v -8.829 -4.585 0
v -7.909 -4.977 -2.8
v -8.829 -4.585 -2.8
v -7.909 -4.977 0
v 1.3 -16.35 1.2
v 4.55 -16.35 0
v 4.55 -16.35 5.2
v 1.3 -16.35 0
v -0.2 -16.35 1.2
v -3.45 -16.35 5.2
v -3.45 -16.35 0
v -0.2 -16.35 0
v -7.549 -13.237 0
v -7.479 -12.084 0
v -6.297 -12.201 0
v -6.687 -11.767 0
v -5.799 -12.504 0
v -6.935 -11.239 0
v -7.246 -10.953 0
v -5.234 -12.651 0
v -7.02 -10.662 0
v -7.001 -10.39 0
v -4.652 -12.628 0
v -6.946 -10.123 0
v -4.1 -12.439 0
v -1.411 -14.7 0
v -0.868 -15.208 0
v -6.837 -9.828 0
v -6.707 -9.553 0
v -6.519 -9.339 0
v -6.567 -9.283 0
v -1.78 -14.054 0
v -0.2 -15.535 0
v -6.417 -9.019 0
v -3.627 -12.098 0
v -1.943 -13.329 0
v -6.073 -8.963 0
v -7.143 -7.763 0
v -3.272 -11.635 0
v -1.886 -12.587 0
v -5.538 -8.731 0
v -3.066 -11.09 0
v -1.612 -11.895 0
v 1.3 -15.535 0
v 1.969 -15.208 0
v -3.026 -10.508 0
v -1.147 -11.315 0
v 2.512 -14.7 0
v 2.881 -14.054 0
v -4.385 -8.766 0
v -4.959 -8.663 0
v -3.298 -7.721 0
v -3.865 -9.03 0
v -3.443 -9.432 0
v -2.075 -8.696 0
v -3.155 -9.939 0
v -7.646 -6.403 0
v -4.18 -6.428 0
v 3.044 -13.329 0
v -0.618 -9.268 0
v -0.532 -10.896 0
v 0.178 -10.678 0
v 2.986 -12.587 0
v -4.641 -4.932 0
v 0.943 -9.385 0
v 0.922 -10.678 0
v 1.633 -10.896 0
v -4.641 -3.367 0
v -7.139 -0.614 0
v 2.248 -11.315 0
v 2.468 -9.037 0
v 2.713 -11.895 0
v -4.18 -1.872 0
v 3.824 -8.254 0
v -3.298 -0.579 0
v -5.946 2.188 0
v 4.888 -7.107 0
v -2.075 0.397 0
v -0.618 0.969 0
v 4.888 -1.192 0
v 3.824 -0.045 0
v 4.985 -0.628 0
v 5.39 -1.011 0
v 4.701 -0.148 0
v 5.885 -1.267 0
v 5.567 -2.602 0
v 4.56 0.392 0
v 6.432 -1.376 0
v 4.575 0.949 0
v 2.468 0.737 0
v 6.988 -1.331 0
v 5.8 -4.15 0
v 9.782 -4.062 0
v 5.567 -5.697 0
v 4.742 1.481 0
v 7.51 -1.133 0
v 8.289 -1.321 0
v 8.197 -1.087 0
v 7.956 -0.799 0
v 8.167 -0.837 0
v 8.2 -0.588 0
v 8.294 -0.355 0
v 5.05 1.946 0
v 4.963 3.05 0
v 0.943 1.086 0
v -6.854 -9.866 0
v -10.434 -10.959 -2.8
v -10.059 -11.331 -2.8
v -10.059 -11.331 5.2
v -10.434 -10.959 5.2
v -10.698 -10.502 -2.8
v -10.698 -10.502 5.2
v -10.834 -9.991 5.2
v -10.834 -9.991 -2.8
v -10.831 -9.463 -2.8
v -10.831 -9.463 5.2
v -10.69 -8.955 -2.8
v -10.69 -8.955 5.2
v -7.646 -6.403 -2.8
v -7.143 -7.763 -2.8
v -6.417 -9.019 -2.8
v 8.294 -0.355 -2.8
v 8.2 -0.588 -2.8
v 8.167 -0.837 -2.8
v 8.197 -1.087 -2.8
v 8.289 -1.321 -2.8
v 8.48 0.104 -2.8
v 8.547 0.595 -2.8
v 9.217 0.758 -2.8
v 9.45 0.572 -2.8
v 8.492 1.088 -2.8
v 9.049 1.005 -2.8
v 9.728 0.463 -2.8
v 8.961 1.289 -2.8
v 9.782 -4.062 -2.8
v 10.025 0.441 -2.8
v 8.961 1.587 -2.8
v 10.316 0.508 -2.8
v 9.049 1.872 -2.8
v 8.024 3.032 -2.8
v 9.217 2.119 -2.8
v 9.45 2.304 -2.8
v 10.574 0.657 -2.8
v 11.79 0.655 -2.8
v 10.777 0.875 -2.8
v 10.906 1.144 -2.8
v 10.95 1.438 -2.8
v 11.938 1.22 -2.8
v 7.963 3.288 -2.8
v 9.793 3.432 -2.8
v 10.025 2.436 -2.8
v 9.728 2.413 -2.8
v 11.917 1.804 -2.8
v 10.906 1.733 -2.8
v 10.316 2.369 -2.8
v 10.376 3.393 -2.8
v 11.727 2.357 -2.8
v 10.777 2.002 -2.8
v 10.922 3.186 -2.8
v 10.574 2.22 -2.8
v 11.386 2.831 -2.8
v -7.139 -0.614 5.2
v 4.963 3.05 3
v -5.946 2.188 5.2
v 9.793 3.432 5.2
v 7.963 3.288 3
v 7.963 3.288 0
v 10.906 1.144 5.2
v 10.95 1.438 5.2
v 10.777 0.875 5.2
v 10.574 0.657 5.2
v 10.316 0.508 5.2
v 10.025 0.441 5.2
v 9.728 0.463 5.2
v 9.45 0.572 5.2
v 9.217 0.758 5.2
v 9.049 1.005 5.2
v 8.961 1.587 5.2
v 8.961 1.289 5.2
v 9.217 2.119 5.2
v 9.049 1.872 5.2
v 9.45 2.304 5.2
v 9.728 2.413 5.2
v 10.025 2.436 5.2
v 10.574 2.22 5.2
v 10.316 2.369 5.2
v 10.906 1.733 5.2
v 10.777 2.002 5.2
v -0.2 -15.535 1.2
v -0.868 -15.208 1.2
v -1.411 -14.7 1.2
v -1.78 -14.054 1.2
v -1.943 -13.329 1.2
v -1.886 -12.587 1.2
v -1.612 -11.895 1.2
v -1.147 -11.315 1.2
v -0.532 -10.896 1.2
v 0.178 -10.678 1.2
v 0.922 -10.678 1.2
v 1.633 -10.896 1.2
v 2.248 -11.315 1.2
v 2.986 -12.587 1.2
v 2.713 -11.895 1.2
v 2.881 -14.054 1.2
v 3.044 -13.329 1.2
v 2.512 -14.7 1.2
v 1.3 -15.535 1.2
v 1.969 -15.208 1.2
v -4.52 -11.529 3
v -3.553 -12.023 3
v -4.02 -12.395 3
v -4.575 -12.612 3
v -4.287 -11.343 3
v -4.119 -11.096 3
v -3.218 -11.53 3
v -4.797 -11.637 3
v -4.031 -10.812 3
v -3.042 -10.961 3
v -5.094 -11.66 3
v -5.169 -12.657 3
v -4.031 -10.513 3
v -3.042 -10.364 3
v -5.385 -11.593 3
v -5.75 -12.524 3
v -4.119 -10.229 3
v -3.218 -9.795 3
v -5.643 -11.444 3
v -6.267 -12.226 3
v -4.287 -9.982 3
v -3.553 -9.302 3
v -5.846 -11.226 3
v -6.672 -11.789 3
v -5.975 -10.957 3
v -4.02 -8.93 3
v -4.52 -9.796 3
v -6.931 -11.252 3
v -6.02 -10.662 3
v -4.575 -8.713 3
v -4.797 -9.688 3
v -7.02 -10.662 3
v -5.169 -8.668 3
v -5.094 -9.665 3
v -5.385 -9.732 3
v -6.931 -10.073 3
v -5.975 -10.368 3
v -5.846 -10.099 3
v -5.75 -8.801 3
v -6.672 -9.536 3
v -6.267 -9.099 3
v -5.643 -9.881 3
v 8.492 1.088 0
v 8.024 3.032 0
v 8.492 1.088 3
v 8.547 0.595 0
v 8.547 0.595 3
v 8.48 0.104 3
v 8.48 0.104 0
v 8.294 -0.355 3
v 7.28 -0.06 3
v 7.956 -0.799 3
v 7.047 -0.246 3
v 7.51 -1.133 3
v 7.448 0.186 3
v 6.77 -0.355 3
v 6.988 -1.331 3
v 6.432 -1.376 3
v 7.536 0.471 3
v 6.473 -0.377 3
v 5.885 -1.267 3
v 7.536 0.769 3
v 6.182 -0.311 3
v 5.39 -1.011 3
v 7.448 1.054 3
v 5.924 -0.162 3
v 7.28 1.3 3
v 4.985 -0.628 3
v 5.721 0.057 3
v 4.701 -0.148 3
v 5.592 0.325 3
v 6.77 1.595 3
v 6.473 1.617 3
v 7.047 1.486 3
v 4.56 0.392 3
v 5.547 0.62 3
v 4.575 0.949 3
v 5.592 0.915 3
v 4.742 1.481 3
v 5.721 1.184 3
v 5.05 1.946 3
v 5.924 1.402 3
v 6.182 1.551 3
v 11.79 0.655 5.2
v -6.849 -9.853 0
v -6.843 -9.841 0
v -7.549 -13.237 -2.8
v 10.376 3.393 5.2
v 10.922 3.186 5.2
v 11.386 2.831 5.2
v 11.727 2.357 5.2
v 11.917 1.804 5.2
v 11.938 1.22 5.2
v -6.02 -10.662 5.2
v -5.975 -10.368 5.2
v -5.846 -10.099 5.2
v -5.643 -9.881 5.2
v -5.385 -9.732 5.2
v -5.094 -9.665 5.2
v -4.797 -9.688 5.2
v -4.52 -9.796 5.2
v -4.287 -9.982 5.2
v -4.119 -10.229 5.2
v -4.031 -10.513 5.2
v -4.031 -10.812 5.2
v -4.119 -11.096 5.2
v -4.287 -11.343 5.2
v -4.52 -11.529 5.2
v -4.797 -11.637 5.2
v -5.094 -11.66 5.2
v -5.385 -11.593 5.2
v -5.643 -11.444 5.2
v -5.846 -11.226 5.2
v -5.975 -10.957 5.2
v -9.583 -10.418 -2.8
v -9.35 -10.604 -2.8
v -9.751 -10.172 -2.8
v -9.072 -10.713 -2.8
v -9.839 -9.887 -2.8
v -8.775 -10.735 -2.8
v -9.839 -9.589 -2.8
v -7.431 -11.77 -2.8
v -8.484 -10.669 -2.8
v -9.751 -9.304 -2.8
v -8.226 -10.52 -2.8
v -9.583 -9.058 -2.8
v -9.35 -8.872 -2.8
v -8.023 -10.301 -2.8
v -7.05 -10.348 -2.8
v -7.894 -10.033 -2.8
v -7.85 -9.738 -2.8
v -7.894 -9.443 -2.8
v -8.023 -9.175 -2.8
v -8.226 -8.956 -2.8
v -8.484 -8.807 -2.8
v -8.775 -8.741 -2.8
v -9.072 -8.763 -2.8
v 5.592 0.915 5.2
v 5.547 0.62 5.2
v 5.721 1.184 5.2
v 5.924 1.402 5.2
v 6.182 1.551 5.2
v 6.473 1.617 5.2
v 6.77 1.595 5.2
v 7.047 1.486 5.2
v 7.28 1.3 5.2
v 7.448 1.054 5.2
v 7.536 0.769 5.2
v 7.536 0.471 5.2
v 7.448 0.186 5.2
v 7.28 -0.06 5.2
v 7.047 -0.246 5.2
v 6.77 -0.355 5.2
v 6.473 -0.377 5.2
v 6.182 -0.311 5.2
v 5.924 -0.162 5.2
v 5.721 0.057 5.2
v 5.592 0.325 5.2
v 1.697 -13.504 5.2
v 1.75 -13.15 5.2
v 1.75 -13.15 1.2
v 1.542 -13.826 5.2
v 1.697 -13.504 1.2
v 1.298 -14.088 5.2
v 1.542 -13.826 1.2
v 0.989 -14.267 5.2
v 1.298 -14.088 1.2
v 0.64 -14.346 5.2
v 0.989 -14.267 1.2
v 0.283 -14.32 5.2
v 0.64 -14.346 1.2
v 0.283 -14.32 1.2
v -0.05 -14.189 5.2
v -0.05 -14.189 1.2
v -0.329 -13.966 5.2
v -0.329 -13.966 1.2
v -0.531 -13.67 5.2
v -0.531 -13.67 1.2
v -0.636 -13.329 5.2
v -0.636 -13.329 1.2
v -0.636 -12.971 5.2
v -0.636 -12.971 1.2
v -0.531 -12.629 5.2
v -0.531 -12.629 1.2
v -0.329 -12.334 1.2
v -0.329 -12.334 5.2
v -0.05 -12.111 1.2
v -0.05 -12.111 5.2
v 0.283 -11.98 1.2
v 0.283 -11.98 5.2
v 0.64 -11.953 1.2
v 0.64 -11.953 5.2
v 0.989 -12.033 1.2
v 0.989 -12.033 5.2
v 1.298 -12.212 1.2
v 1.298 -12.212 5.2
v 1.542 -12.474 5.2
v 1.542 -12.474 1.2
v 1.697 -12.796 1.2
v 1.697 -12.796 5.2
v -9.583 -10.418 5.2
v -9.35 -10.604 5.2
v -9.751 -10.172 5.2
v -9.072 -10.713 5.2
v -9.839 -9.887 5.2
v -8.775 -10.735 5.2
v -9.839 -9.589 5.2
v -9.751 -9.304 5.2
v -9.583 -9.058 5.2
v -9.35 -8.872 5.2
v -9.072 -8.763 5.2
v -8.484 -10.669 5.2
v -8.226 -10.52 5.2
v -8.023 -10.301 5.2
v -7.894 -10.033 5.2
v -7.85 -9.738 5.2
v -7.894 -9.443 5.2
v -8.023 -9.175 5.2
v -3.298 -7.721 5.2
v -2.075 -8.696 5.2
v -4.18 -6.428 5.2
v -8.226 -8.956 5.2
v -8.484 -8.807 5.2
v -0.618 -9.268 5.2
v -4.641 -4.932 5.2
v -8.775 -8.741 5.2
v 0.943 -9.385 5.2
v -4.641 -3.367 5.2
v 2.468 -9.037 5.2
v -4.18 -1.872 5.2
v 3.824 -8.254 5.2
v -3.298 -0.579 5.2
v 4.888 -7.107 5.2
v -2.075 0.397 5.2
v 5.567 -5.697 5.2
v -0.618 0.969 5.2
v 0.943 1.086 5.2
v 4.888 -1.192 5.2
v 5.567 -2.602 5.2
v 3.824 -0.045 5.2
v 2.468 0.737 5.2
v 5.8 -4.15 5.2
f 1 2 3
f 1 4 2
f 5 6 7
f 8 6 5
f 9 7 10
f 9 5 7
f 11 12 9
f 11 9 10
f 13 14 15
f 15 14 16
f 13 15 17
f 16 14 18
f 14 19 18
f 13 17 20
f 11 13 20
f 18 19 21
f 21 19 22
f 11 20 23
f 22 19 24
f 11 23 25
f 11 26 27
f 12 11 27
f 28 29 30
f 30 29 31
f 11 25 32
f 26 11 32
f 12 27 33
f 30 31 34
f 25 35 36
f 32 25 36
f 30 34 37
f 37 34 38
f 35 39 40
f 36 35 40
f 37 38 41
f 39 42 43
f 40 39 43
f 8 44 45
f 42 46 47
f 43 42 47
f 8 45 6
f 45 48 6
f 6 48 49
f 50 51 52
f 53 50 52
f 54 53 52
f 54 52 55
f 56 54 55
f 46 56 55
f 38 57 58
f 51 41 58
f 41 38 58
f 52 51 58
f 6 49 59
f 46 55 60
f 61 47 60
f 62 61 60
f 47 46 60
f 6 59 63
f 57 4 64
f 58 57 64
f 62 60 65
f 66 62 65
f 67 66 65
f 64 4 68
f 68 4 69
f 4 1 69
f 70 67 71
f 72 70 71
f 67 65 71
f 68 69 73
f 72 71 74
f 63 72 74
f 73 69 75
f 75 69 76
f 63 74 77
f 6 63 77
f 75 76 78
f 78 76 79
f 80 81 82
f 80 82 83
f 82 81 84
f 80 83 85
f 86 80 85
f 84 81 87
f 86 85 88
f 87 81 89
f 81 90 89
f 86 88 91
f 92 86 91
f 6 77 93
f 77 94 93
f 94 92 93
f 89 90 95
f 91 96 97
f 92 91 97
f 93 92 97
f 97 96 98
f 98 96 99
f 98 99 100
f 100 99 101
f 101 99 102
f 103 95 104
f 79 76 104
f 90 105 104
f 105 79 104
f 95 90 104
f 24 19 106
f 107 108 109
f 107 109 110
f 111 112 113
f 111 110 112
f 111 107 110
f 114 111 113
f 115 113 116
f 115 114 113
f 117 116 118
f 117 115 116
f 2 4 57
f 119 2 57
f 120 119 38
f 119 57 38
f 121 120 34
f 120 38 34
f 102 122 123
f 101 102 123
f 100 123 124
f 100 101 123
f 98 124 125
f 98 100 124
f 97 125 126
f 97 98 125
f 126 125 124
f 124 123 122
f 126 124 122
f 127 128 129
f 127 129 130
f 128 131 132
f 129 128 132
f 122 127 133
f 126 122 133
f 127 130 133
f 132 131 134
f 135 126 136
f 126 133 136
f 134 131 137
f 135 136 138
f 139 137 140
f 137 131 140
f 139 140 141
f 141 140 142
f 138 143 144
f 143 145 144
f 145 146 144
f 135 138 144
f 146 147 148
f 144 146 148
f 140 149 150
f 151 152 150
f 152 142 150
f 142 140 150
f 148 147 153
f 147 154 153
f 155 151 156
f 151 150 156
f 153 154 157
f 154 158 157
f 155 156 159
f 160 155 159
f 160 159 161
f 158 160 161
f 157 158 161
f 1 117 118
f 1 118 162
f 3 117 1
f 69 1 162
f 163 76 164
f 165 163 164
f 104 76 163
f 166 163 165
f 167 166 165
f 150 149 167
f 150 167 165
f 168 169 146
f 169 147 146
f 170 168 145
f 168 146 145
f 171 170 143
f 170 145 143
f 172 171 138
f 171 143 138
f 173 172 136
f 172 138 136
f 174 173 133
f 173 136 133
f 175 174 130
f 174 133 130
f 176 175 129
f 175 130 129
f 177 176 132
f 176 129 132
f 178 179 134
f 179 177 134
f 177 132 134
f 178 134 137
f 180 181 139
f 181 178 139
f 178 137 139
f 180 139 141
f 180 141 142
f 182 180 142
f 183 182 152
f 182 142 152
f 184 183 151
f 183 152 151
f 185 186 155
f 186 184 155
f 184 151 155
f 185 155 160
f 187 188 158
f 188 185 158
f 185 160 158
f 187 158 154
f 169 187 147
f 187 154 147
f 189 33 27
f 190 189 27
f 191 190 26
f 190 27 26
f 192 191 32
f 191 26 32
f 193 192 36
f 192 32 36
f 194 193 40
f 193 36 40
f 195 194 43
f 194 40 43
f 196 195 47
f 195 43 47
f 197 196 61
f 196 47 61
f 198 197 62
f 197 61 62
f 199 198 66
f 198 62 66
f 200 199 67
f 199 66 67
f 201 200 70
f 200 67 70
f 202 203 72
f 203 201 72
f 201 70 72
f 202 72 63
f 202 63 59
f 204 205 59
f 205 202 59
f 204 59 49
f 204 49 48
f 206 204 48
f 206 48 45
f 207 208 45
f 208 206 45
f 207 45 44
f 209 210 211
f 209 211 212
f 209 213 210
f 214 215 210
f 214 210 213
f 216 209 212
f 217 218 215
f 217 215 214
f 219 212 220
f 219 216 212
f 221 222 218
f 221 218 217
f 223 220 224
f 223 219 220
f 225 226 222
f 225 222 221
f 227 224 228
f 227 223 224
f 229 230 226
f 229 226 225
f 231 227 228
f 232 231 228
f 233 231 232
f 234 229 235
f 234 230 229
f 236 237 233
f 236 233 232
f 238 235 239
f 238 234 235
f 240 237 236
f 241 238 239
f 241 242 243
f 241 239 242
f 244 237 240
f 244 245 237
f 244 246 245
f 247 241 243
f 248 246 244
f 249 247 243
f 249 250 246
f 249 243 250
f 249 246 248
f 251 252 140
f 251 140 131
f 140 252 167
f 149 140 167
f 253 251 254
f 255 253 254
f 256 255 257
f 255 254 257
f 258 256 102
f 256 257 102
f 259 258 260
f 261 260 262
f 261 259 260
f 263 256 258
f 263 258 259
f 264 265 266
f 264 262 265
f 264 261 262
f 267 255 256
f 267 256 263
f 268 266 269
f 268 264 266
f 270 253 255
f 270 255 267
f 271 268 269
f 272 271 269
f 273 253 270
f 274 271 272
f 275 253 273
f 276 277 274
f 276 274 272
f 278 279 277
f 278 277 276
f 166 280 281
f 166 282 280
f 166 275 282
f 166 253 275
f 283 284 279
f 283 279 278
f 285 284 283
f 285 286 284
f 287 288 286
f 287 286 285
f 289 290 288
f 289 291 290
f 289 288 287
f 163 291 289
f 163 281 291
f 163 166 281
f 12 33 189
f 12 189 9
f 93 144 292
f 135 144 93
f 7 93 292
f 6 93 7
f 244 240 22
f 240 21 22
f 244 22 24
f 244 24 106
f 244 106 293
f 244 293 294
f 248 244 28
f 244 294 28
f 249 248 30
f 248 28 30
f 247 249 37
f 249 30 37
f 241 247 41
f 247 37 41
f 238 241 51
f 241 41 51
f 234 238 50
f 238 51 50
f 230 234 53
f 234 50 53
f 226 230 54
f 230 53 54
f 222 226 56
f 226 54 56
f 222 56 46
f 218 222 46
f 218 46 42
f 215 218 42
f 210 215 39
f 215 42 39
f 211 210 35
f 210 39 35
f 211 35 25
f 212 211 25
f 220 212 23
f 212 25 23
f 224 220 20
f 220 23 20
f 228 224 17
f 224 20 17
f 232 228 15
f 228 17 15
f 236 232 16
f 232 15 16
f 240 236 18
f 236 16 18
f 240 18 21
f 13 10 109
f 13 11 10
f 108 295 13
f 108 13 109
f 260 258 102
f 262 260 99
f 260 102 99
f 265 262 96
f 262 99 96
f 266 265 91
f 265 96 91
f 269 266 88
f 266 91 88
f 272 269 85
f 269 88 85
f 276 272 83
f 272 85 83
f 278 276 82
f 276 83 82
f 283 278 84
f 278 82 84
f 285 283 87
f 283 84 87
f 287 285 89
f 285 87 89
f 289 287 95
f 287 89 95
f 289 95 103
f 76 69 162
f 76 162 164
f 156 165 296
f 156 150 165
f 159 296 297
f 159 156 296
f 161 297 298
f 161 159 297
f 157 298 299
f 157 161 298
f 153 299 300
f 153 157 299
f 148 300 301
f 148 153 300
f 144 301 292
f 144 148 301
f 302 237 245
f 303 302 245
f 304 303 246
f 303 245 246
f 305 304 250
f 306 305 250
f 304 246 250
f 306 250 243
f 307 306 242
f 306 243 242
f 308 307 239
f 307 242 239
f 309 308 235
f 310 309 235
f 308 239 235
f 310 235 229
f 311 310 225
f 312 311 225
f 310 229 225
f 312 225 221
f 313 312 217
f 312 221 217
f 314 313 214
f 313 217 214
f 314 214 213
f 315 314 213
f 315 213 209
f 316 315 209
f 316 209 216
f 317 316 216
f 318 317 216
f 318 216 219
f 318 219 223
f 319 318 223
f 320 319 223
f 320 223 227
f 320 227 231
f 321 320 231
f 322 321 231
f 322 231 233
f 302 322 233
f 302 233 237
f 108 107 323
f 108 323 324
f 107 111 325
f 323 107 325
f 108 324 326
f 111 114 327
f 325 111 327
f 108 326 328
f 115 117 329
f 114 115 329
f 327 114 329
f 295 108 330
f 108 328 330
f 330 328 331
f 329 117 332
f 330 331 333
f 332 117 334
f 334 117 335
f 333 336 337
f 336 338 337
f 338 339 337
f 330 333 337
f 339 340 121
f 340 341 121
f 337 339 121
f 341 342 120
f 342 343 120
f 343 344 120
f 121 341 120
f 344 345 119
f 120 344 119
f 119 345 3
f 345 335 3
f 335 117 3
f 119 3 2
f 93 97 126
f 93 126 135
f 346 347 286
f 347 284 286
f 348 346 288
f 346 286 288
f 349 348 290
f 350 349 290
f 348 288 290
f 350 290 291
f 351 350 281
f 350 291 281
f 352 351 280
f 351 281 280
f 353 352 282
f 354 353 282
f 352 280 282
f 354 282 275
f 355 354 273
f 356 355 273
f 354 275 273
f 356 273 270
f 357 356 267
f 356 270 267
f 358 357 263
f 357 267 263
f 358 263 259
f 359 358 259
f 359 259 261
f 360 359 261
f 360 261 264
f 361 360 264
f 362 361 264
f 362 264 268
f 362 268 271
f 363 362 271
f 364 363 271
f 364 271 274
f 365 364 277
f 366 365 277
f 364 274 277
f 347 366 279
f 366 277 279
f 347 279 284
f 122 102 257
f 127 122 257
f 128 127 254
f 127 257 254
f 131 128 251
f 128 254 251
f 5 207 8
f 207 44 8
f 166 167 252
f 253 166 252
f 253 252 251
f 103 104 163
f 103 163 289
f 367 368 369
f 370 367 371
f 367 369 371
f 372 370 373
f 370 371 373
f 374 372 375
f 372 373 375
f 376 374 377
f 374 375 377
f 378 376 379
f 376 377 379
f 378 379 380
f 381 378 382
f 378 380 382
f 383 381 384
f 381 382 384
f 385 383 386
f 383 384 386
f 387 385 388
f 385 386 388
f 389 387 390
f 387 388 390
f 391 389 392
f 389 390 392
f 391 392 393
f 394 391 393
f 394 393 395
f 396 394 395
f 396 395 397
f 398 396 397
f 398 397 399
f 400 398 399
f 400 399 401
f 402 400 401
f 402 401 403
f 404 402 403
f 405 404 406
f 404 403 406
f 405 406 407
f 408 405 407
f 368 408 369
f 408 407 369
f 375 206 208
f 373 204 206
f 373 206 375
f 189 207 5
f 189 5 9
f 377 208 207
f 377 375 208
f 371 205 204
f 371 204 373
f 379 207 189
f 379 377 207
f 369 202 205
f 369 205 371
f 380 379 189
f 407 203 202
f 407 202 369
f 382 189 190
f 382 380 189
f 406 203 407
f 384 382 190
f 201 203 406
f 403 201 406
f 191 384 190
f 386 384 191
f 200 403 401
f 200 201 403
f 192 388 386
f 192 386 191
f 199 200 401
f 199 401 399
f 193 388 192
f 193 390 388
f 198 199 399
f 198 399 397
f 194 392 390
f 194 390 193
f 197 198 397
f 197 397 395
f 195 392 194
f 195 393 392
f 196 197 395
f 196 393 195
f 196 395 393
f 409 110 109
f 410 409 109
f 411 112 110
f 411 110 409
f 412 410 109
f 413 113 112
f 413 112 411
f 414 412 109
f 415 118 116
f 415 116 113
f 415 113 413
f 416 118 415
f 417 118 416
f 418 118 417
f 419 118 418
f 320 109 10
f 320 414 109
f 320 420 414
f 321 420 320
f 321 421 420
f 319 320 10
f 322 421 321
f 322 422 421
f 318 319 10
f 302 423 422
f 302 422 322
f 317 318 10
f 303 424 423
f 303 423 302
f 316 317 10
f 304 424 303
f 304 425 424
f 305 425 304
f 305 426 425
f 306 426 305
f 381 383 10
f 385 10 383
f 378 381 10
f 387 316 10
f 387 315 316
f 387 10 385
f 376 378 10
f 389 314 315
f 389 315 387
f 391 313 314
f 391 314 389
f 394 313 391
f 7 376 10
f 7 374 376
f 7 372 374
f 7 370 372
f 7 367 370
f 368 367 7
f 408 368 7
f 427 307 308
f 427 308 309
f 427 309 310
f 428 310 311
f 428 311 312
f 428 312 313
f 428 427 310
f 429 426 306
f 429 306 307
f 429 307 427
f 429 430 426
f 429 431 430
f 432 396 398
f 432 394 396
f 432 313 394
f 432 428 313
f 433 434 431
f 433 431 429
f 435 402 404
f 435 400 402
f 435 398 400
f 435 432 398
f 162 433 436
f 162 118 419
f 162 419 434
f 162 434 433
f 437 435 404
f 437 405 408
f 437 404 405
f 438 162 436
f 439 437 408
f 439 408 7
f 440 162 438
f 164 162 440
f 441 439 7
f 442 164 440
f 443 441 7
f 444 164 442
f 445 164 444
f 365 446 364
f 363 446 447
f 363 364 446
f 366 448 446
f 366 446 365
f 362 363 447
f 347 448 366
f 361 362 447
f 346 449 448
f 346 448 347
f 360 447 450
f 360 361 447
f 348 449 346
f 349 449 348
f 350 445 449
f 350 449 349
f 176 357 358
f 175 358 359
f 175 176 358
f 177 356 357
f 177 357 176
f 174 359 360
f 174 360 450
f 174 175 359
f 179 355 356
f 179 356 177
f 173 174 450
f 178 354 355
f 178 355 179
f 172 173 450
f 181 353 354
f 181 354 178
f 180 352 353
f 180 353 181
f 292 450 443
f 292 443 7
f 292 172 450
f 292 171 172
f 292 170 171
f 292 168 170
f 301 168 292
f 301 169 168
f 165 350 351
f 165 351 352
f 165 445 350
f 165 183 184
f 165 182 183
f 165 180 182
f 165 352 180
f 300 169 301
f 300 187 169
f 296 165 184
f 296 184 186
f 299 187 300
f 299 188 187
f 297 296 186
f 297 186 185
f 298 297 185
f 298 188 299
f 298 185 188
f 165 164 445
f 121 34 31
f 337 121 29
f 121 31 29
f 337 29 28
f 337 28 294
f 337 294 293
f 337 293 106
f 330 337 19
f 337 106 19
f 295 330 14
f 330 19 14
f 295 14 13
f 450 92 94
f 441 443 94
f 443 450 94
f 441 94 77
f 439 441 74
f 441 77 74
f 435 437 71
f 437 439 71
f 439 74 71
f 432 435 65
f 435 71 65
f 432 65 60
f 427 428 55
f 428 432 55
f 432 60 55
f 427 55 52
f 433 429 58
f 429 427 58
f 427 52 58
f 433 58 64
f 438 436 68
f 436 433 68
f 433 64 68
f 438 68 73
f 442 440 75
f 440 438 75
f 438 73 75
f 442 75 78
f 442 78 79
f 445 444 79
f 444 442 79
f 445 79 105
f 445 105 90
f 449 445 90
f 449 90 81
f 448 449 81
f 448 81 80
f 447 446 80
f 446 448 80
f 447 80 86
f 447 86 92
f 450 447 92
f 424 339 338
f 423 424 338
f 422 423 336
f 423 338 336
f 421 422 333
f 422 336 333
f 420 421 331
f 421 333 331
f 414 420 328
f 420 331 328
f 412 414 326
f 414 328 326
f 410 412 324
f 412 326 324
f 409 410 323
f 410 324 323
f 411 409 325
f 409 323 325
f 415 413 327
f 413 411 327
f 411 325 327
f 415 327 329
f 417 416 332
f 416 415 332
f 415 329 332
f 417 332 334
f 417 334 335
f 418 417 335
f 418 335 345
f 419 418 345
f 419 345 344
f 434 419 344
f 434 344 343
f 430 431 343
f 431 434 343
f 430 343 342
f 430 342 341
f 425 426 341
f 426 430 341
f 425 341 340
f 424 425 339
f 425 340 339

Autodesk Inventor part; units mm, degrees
sketch "sk_mainbody" plane through (0, 0, 0) normal (0, 0, 1) x (1, 0, 0)
  line L0 (-7.1386, -0.6138) -> (9.4827, 3.383) construction
  line L1 (-10.6899, -8.9546) -> (-7.1386, -0.6138) projected
  arc A0 (-10.6899, -8.9546) -> (-10.0592, -11.3309) centre (-8.8497, -9.7381) ccw projected
  line L2 (-3.4497, -16.3498) -> (-10.0592, -11.3309) projected
  circle A1 centre (-8.8497, -9.7381) radius 1 projected
  circle A2 centre (9.9503, 1.4384) radius 1 projected
  arc A3 (11.7904, 0.655) -> (9.4827, 3.383) centre (9.9503, 1.4384) ccw projected
  line L3 (11.7904, 0.655) -> (4.5503, -16.3498) projected
  line L4 (4.5503, -16.3498) -> (-3.4497, -16.3498) projected
  circle A4 centre (0.5503, -4.1498) radius 3.4 construction
  circle A5 centre (0.5503, -13.1498) radius 1 construction
  circle A6 centre (0.5503, -4.1498) radius 5.25
  line L5 (-7.1386, -0.6138) -> (-5.9457, 2.1878)
  line L6 (-5.9457, 2.1878) -> (9.7927, 3.4322)
  circle A7 centre (0.5503, -13.1498) radius 1.2
  point P0 (0, 0)
  dimension "d0" = 10.5
  dimension "d1" = 9
  dimension "d37" = 2.4
extrude "ext_mainbody" add sketch "sk_mainbody" along normal blind 5.2
sketch "sk_bottomsupport" plane through (0, 0, 0) normal (0, 0, 1) x (1, 0, 0)
  line L0 (-10.6899, -8.9546) -> (-7.1386, -0.6138) projected
  arc A0 (-10.6899, -8.9546) -> (-10.0592, -11.3309) centre (-8.8497, -9.7381) ccw projected
  line L1 (-3.4497, -16.3498) -> (-10.0592, -11.3309) projected
  line L2 (4.5503, -16.3498) -> (-3.4497, -16.3498) projected
  line L3 (11.7904, 0.655) -> (4.5503, -16.3498) projected
  arc A1 (11.7904, 0.655) -> (9.4827, 3.383) centre (9.9503, 1.4384) ccw projected
  line L4 (-7.1386, -0.6138) -> (9.4827, 3.383) projected
  circle A2 centre (-8.8497, -9.7381) radius 1 projected
  circle A3 centre (9.9503, 1.4384) radius 1 projected
  circle A4 centre (0.5503, -13.1498) radius 1 construction
  arc A5 (-6.417, -9.0187) -> (-7.5492, -13.2368) centre (0.5503, -13.1498) ccw
  circle A6 centre (-4.5247, -4.1498) radius 1 construction
  circle A7 centre (0.5503, -4.1498) radius 3.4 construction
  circle A8 centre (0.5503, -4.1498) radius 5 construction
  circle A9 centre (-5.0196, -10.6625) radius 2 construction
  circle A10 centre (6.5473, 0.6202) radius 2 construction
  circle A11 centre (6.5473, 0.6202) radius 1
  circle A12 centre (-5.0196, -10.6625) radius 1
  circle A13 centre (9.9503, 1.4384) radius 1.5 construction
  circle A14 centre (0.5503, -4.1498) radius 5.6627 construction
  arc A15 (-7.9094, -4.9768) -> (-6.417, -9.0187) centre (0.5503, -4.1498) ccw
  line L5 (-7.9094, -4.9768) -> (-8.8294, -4.5851)
  line L6 (8.0243, 3.0323) -> (8.4919, 1.0877)
  arc A16 (7.9873, -0.7678) -> (8.4919, 1.0877) centre (6.5473, 0.6202) ccw
  line L7 (-5.0196, -10.6625) -> (-7.1846, -13.5137) construction
  line L8 (-5.0196, -10.6625) -> (-2.8545, -7.8114) construction
  line L9 (7.9873, -0.7678) -> (9.7823, -4.0616)
  arc A17 (8.2936, -0.3548) -> (8.2887, -1.3207) centre (9.1667, -0.8422) ccw
  line L10 (9.7927, 3.4322) -> (-5.9457, 2.1878) projected
  line L11 (8.0243, 3.0323) -> (7.9629, 3.2876)
  point P0 (0, 0)
  point P1 (-5.2757, -0.1658)
  dimension "d12" = 10
  dimension "d16" = 3
  dimension "d5" = 8.1
  dimension "d13" = 4
  dimension "d15" = 2
  dimension "d17" = 11.3254
  dimension "d18" = 8.5
  dimension "d20" = 1
  dimension "d21" = 1
  dimension "d22" = 5.5
ref_plane "Work Plane1" through (-10.5497, -16.3498, -2.2) normal (0, 0, 1) x (1, 0, 0)
ref_plane "Work Plane2" through (-10.8497, -16.3498, -2.5) normal (0, 0, 1) x (1, 0, 0)
ref_plane "Work Plane3" through (-10.8497, -16.3498, -2.8) normal (0, 0, 1) x (1, 0, 0)
extrude "ext_bottomsupport" add sketch "sk_bottomsupport" against normal up to surface (2.8 mm away) contours L0 L5 A15 A5 L1 A0 | L11 L10 A1 L4 | L4 A1 L3 L9 A17 A16 L6
sketch "sk_mountholes" plane through (0, 0, 0) normal (0, 0, -1) x (-1, 0, 0)
  line L0 (-7.9629, 3.2876) -> (-8.4919, 1.0877) projected
  arc A0 (-8.4919, 1.0877) -> (-8.2936, -0.3548) centre (-6.5473, 0.6202) ccw projected
  line L1 (-9.7927, 3.4322) -> (5.9457, 2.1878) projected
  circle A1 centre (-6.5473, 0.6202) radius 2 projected
  circle A2 centre (5.0196, -10.6625) radius 2 projected
  circle A3 centre (-6.5473, 0.6202) radius 1 projected
  circle A4 centre (5.0196, -10.6625) radius 1 projected
  line L2 (-8.0243, 3.0323) -> (-7.9629, 3.2876) projected
  line L3 (-8.0243, 3.0323) -> (-8.4919, 1.0877) projected
  line L4 (-4.9629, 3.0503) -> (-5.0502, 1.9463)
  point P0 (0, 0)
  point P1 (-8.0383, 2.9491)
  dimension "d28" = 3
extrude "ext_mountholes_head" cut sketch "sk_mountholes" against normal blind 3 contours L1 L4 A1 L0 | A1 A0 | A2 | A3 | A4
extrude "ext_mountholes_screw" cut sketch "sk_mountholes" against normal through all contours A3 | A4
sketch "Sketch8" plane through (0, 0, 0) normal (0, 0, -1) x (-1, 0, 0)
  line L0 (3.4497, -16.3498) -> (-4.5503, -16.3498) projected
  circle A0 centre (-0.5503, -13.1498) radius 1 projected
  circle A1 centre (-0.5503, -13.1498) radius 2.5
  line L1 (-0.5503, -13.1498) -> (-0.5503, -16.3498) construction
  line L2 (-1.3003, -15.5347) -> (-1.3003, -16.3498)
  line L3 (0.1997, -15.5347) -> (0.1997, -16.3498)
  point P0 (0, 0)
  dimension "d33" = 5
  dimension "d34" = 1.5
extrude "ext_gearhousing" cut sketch "Sketch8" against normal blind 1.2
equation "\"d37\" = general_dowel_diameter"
equation "\"general_dowel_diameter\" = 2.4"
properties part number "linact_top"
